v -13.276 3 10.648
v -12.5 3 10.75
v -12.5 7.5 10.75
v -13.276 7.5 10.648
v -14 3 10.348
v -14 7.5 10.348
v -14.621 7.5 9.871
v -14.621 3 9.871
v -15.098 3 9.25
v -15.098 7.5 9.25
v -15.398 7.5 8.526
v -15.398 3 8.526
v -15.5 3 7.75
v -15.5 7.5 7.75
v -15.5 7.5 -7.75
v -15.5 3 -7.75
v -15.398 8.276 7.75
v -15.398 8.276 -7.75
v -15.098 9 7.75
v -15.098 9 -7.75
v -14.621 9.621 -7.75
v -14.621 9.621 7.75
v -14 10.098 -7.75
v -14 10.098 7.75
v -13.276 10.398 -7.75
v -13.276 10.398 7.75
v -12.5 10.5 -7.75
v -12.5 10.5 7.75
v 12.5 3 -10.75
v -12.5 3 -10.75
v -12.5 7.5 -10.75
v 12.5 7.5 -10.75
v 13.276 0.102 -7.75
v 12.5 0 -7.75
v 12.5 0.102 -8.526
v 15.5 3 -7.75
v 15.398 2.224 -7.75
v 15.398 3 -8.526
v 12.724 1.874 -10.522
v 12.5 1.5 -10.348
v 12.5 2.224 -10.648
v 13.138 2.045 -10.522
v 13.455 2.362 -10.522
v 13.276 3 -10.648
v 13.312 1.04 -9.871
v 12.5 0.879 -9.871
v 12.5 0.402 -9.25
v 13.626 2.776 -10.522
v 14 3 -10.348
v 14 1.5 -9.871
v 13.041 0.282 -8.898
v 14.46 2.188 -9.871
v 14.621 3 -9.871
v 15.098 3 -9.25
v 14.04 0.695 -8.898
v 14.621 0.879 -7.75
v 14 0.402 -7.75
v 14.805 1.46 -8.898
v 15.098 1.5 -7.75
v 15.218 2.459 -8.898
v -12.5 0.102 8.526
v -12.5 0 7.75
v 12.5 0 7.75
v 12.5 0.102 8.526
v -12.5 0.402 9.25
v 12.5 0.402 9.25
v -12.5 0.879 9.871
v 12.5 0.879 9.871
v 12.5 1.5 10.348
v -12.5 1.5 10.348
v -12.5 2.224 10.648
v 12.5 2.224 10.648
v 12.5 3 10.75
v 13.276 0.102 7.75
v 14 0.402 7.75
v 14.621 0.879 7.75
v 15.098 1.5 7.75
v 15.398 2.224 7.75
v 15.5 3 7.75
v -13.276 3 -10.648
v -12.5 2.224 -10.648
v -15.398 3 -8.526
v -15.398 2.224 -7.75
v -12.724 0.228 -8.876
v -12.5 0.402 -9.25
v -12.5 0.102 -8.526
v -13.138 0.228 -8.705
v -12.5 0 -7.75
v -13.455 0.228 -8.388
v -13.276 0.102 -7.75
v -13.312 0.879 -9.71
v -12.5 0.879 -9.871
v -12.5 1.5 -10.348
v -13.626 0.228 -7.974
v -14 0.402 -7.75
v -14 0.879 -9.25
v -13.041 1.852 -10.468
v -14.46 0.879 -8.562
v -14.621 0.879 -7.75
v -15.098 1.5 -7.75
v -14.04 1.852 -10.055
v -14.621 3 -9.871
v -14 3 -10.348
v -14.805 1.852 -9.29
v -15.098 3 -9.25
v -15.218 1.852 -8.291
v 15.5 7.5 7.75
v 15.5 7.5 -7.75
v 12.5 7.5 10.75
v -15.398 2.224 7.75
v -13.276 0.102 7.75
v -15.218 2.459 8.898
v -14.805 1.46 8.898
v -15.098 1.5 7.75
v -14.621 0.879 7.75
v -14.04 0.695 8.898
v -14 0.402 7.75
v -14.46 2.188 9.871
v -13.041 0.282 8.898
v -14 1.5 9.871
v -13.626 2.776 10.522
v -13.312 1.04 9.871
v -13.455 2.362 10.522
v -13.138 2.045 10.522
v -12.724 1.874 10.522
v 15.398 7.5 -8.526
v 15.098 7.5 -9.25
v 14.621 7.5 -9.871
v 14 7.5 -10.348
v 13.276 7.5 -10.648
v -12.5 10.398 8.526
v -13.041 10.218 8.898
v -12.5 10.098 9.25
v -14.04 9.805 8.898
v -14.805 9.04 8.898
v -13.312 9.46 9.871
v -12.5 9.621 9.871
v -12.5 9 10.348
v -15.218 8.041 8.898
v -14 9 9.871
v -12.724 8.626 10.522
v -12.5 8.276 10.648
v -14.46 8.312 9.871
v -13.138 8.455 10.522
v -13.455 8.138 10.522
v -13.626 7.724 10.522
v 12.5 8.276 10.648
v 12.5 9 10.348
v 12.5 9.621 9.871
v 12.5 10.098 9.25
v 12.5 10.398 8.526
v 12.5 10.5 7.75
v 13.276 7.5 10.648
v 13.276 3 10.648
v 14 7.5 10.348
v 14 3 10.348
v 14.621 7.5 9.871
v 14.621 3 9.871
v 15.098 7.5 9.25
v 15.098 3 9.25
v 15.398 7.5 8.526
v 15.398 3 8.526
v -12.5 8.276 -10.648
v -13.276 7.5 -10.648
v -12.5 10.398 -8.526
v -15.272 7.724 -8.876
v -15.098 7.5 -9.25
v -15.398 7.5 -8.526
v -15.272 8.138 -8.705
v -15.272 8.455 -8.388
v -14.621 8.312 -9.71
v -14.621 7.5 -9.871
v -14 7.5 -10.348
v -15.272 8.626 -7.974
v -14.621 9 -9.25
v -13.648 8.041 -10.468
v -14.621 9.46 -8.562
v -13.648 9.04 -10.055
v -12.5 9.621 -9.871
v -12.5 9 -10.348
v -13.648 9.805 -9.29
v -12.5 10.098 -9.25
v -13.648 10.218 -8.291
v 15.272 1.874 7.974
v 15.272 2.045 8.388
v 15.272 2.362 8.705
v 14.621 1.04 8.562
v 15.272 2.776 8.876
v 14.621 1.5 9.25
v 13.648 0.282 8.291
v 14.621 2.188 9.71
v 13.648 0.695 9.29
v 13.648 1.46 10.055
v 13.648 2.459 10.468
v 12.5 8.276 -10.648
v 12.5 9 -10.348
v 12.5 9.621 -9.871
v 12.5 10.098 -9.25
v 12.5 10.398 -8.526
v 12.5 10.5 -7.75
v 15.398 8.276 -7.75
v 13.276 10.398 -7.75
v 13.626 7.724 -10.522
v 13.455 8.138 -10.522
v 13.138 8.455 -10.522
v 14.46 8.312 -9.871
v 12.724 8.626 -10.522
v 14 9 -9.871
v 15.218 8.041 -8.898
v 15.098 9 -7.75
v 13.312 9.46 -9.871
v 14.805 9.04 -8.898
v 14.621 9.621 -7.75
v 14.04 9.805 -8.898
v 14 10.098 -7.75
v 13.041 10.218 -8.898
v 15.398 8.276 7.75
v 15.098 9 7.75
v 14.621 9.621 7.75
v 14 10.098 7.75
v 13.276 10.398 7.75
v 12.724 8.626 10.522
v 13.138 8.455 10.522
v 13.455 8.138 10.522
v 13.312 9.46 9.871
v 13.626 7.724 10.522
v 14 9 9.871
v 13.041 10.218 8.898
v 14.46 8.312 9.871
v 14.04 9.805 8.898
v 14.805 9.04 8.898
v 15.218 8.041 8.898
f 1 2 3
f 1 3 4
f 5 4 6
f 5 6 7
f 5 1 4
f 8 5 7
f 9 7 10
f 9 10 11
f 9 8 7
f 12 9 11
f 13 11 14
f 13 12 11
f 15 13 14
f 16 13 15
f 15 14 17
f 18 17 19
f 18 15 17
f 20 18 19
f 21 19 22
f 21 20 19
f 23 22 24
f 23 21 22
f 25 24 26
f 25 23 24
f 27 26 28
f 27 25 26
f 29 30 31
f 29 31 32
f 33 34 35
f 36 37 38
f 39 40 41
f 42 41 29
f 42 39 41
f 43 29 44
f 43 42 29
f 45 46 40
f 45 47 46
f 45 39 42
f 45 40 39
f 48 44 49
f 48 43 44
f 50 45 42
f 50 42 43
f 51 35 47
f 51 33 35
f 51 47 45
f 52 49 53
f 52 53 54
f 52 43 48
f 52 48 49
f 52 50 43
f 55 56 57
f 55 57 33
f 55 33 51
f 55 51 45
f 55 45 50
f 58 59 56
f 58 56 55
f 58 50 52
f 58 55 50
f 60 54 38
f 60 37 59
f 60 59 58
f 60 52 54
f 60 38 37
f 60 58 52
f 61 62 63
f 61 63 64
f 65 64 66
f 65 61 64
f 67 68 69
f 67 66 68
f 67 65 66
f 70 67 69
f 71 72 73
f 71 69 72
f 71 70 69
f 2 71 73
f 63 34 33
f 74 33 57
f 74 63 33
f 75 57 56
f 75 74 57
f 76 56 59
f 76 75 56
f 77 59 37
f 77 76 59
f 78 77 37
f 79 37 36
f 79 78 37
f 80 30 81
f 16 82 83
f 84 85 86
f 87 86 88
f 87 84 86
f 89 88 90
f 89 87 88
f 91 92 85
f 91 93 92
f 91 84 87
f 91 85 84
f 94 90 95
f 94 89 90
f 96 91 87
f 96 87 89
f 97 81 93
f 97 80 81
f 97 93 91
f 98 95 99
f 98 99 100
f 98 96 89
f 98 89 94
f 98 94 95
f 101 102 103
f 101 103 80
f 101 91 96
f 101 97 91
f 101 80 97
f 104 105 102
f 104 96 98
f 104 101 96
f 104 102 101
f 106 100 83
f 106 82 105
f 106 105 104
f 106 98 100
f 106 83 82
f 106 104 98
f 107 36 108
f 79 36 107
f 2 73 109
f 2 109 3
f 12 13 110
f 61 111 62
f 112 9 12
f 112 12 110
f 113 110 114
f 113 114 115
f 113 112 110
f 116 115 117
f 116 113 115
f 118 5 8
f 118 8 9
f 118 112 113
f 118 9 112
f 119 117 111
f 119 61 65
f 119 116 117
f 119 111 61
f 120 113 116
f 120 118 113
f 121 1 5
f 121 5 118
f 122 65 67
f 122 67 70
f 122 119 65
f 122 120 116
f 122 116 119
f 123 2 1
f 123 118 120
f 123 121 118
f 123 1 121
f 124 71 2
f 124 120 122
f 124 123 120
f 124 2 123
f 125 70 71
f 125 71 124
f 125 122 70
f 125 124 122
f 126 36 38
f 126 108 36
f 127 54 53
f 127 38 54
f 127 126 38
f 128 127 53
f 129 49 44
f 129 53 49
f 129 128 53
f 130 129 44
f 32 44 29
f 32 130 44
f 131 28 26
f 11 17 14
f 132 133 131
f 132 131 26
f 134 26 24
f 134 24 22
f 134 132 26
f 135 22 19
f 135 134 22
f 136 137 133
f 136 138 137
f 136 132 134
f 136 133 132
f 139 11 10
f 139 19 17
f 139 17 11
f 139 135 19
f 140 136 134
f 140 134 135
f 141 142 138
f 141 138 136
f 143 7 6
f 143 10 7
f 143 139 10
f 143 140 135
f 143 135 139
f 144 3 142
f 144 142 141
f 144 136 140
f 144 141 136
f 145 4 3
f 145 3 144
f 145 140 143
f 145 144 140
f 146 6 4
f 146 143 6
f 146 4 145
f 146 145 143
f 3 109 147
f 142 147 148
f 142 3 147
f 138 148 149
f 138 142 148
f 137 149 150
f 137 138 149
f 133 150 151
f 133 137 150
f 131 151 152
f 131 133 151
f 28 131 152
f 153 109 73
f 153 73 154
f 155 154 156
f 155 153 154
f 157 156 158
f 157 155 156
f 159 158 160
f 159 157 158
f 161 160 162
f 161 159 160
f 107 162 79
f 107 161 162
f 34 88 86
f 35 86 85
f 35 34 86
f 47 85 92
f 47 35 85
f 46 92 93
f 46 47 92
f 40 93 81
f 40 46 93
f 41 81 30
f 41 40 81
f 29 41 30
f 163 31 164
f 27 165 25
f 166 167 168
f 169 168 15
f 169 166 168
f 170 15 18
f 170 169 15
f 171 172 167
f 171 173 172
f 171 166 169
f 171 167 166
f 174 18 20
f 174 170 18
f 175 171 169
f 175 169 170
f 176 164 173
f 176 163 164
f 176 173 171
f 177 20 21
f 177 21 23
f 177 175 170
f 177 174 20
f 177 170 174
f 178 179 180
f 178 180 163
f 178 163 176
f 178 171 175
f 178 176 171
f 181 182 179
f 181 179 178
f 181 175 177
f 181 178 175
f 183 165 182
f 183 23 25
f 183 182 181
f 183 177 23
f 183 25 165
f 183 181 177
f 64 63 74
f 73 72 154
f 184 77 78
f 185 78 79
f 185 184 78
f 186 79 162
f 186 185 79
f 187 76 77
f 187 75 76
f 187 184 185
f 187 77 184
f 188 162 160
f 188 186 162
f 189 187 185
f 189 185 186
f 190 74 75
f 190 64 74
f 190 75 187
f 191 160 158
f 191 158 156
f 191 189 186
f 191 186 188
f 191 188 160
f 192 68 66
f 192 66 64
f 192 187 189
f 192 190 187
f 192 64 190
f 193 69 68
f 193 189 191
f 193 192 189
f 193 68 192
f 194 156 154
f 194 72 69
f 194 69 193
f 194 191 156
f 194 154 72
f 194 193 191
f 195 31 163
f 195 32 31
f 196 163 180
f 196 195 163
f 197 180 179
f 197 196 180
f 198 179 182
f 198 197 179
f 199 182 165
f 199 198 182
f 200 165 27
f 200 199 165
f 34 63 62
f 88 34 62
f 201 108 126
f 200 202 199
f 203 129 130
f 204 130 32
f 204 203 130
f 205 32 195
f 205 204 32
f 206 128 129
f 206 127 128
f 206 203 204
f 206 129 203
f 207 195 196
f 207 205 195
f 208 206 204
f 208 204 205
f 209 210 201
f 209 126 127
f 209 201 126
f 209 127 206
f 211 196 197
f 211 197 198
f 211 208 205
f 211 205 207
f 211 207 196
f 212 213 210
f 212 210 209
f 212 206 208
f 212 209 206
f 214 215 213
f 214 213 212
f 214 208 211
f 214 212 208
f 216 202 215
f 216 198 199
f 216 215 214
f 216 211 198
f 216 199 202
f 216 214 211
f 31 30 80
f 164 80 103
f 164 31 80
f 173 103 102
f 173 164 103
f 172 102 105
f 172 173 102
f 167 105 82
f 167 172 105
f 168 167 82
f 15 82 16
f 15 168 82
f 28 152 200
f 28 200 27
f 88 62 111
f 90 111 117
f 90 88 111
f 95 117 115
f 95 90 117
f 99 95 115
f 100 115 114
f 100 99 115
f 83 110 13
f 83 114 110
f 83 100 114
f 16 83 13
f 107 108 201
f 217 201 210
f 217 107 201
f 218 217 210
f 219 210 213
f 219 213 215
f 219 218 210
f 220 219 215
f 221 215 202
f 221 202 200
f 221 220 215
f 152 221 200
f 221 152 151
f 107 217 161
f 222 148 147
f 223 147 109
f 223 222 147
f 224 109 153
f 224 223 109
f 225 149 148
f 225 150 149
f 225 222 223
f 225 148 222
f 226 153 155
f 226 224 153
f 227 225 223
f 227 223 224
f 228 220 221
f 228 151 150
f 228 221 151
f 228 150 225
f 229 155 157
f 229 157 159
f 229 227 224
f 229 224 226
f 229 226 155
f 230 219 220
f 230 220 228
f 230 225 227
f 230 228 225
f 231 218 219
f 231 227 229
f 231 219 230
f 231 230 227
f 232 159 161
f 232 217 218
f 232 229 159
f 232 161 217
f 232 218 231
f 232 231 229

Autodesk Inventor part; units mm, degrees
ref_plane "YZ Plane" through (0, 0, 0) normal (1, 0, 0) x (0, 1, 0)
ref_plane "XZ Plane" through (0, 0, 0) normal (0, 1, 0) x (-1, 0, 0)
ref_plane "XY Plane" through (0, 0, 0) normal (0, 0, 1) x (1, 0, 0)
sketch "スケッチ1" plane through (0, 0, 0) normal (0, 1, 0) x (-1, 0, 0)
  line L0 (15.5, -10.75) -> (-15.5, -10.75)
  line L1 (-15.5, -10.75) -> (-15.5, 10.75)
  line L2 (-15.5, 10.75) -> (15.5, 10.75)
  line L3 (15.5, 10.75) -> (15.5, -10.75)
  line L4 (15.5, -10.75) -> (-15.5, 10.75)
  point P0 (0, 0)
  point P1 (0, 0)
  dimension "d0" = 31
  dimension "d1" = 21.5
extrude "押し出し1" add sketch "スケッチ1" along normal blind 10.5
fillet "フィレット1" radius 3 11 edges at (15.5, 10.5, 0) (0, 10.5, 10.75) (0, 0, 10.75) (15.5, 5.25, 10.75) (15.5, 0, 0) (15.5, 5.25, -10.75) (0, 10.5, -10.75) (-15.5, 10.5, 0) (-15.5, 5.25, -10.75) (-15.5, 0, 0) (0, 0, -10.75)
ref_plane "作業平面1" through (0, 3, -7.75) normal (1, 0, 0) x (0, 0, -1)
fillet "フィレット2" radius 3 3 edges at (-14.6213, 9.6213, 9.8713) (-14.6213, 0.8787, 9.8713) (-15.5, 5.25, 10.75)
properties part number "battery" material "LCP プラスチック"
